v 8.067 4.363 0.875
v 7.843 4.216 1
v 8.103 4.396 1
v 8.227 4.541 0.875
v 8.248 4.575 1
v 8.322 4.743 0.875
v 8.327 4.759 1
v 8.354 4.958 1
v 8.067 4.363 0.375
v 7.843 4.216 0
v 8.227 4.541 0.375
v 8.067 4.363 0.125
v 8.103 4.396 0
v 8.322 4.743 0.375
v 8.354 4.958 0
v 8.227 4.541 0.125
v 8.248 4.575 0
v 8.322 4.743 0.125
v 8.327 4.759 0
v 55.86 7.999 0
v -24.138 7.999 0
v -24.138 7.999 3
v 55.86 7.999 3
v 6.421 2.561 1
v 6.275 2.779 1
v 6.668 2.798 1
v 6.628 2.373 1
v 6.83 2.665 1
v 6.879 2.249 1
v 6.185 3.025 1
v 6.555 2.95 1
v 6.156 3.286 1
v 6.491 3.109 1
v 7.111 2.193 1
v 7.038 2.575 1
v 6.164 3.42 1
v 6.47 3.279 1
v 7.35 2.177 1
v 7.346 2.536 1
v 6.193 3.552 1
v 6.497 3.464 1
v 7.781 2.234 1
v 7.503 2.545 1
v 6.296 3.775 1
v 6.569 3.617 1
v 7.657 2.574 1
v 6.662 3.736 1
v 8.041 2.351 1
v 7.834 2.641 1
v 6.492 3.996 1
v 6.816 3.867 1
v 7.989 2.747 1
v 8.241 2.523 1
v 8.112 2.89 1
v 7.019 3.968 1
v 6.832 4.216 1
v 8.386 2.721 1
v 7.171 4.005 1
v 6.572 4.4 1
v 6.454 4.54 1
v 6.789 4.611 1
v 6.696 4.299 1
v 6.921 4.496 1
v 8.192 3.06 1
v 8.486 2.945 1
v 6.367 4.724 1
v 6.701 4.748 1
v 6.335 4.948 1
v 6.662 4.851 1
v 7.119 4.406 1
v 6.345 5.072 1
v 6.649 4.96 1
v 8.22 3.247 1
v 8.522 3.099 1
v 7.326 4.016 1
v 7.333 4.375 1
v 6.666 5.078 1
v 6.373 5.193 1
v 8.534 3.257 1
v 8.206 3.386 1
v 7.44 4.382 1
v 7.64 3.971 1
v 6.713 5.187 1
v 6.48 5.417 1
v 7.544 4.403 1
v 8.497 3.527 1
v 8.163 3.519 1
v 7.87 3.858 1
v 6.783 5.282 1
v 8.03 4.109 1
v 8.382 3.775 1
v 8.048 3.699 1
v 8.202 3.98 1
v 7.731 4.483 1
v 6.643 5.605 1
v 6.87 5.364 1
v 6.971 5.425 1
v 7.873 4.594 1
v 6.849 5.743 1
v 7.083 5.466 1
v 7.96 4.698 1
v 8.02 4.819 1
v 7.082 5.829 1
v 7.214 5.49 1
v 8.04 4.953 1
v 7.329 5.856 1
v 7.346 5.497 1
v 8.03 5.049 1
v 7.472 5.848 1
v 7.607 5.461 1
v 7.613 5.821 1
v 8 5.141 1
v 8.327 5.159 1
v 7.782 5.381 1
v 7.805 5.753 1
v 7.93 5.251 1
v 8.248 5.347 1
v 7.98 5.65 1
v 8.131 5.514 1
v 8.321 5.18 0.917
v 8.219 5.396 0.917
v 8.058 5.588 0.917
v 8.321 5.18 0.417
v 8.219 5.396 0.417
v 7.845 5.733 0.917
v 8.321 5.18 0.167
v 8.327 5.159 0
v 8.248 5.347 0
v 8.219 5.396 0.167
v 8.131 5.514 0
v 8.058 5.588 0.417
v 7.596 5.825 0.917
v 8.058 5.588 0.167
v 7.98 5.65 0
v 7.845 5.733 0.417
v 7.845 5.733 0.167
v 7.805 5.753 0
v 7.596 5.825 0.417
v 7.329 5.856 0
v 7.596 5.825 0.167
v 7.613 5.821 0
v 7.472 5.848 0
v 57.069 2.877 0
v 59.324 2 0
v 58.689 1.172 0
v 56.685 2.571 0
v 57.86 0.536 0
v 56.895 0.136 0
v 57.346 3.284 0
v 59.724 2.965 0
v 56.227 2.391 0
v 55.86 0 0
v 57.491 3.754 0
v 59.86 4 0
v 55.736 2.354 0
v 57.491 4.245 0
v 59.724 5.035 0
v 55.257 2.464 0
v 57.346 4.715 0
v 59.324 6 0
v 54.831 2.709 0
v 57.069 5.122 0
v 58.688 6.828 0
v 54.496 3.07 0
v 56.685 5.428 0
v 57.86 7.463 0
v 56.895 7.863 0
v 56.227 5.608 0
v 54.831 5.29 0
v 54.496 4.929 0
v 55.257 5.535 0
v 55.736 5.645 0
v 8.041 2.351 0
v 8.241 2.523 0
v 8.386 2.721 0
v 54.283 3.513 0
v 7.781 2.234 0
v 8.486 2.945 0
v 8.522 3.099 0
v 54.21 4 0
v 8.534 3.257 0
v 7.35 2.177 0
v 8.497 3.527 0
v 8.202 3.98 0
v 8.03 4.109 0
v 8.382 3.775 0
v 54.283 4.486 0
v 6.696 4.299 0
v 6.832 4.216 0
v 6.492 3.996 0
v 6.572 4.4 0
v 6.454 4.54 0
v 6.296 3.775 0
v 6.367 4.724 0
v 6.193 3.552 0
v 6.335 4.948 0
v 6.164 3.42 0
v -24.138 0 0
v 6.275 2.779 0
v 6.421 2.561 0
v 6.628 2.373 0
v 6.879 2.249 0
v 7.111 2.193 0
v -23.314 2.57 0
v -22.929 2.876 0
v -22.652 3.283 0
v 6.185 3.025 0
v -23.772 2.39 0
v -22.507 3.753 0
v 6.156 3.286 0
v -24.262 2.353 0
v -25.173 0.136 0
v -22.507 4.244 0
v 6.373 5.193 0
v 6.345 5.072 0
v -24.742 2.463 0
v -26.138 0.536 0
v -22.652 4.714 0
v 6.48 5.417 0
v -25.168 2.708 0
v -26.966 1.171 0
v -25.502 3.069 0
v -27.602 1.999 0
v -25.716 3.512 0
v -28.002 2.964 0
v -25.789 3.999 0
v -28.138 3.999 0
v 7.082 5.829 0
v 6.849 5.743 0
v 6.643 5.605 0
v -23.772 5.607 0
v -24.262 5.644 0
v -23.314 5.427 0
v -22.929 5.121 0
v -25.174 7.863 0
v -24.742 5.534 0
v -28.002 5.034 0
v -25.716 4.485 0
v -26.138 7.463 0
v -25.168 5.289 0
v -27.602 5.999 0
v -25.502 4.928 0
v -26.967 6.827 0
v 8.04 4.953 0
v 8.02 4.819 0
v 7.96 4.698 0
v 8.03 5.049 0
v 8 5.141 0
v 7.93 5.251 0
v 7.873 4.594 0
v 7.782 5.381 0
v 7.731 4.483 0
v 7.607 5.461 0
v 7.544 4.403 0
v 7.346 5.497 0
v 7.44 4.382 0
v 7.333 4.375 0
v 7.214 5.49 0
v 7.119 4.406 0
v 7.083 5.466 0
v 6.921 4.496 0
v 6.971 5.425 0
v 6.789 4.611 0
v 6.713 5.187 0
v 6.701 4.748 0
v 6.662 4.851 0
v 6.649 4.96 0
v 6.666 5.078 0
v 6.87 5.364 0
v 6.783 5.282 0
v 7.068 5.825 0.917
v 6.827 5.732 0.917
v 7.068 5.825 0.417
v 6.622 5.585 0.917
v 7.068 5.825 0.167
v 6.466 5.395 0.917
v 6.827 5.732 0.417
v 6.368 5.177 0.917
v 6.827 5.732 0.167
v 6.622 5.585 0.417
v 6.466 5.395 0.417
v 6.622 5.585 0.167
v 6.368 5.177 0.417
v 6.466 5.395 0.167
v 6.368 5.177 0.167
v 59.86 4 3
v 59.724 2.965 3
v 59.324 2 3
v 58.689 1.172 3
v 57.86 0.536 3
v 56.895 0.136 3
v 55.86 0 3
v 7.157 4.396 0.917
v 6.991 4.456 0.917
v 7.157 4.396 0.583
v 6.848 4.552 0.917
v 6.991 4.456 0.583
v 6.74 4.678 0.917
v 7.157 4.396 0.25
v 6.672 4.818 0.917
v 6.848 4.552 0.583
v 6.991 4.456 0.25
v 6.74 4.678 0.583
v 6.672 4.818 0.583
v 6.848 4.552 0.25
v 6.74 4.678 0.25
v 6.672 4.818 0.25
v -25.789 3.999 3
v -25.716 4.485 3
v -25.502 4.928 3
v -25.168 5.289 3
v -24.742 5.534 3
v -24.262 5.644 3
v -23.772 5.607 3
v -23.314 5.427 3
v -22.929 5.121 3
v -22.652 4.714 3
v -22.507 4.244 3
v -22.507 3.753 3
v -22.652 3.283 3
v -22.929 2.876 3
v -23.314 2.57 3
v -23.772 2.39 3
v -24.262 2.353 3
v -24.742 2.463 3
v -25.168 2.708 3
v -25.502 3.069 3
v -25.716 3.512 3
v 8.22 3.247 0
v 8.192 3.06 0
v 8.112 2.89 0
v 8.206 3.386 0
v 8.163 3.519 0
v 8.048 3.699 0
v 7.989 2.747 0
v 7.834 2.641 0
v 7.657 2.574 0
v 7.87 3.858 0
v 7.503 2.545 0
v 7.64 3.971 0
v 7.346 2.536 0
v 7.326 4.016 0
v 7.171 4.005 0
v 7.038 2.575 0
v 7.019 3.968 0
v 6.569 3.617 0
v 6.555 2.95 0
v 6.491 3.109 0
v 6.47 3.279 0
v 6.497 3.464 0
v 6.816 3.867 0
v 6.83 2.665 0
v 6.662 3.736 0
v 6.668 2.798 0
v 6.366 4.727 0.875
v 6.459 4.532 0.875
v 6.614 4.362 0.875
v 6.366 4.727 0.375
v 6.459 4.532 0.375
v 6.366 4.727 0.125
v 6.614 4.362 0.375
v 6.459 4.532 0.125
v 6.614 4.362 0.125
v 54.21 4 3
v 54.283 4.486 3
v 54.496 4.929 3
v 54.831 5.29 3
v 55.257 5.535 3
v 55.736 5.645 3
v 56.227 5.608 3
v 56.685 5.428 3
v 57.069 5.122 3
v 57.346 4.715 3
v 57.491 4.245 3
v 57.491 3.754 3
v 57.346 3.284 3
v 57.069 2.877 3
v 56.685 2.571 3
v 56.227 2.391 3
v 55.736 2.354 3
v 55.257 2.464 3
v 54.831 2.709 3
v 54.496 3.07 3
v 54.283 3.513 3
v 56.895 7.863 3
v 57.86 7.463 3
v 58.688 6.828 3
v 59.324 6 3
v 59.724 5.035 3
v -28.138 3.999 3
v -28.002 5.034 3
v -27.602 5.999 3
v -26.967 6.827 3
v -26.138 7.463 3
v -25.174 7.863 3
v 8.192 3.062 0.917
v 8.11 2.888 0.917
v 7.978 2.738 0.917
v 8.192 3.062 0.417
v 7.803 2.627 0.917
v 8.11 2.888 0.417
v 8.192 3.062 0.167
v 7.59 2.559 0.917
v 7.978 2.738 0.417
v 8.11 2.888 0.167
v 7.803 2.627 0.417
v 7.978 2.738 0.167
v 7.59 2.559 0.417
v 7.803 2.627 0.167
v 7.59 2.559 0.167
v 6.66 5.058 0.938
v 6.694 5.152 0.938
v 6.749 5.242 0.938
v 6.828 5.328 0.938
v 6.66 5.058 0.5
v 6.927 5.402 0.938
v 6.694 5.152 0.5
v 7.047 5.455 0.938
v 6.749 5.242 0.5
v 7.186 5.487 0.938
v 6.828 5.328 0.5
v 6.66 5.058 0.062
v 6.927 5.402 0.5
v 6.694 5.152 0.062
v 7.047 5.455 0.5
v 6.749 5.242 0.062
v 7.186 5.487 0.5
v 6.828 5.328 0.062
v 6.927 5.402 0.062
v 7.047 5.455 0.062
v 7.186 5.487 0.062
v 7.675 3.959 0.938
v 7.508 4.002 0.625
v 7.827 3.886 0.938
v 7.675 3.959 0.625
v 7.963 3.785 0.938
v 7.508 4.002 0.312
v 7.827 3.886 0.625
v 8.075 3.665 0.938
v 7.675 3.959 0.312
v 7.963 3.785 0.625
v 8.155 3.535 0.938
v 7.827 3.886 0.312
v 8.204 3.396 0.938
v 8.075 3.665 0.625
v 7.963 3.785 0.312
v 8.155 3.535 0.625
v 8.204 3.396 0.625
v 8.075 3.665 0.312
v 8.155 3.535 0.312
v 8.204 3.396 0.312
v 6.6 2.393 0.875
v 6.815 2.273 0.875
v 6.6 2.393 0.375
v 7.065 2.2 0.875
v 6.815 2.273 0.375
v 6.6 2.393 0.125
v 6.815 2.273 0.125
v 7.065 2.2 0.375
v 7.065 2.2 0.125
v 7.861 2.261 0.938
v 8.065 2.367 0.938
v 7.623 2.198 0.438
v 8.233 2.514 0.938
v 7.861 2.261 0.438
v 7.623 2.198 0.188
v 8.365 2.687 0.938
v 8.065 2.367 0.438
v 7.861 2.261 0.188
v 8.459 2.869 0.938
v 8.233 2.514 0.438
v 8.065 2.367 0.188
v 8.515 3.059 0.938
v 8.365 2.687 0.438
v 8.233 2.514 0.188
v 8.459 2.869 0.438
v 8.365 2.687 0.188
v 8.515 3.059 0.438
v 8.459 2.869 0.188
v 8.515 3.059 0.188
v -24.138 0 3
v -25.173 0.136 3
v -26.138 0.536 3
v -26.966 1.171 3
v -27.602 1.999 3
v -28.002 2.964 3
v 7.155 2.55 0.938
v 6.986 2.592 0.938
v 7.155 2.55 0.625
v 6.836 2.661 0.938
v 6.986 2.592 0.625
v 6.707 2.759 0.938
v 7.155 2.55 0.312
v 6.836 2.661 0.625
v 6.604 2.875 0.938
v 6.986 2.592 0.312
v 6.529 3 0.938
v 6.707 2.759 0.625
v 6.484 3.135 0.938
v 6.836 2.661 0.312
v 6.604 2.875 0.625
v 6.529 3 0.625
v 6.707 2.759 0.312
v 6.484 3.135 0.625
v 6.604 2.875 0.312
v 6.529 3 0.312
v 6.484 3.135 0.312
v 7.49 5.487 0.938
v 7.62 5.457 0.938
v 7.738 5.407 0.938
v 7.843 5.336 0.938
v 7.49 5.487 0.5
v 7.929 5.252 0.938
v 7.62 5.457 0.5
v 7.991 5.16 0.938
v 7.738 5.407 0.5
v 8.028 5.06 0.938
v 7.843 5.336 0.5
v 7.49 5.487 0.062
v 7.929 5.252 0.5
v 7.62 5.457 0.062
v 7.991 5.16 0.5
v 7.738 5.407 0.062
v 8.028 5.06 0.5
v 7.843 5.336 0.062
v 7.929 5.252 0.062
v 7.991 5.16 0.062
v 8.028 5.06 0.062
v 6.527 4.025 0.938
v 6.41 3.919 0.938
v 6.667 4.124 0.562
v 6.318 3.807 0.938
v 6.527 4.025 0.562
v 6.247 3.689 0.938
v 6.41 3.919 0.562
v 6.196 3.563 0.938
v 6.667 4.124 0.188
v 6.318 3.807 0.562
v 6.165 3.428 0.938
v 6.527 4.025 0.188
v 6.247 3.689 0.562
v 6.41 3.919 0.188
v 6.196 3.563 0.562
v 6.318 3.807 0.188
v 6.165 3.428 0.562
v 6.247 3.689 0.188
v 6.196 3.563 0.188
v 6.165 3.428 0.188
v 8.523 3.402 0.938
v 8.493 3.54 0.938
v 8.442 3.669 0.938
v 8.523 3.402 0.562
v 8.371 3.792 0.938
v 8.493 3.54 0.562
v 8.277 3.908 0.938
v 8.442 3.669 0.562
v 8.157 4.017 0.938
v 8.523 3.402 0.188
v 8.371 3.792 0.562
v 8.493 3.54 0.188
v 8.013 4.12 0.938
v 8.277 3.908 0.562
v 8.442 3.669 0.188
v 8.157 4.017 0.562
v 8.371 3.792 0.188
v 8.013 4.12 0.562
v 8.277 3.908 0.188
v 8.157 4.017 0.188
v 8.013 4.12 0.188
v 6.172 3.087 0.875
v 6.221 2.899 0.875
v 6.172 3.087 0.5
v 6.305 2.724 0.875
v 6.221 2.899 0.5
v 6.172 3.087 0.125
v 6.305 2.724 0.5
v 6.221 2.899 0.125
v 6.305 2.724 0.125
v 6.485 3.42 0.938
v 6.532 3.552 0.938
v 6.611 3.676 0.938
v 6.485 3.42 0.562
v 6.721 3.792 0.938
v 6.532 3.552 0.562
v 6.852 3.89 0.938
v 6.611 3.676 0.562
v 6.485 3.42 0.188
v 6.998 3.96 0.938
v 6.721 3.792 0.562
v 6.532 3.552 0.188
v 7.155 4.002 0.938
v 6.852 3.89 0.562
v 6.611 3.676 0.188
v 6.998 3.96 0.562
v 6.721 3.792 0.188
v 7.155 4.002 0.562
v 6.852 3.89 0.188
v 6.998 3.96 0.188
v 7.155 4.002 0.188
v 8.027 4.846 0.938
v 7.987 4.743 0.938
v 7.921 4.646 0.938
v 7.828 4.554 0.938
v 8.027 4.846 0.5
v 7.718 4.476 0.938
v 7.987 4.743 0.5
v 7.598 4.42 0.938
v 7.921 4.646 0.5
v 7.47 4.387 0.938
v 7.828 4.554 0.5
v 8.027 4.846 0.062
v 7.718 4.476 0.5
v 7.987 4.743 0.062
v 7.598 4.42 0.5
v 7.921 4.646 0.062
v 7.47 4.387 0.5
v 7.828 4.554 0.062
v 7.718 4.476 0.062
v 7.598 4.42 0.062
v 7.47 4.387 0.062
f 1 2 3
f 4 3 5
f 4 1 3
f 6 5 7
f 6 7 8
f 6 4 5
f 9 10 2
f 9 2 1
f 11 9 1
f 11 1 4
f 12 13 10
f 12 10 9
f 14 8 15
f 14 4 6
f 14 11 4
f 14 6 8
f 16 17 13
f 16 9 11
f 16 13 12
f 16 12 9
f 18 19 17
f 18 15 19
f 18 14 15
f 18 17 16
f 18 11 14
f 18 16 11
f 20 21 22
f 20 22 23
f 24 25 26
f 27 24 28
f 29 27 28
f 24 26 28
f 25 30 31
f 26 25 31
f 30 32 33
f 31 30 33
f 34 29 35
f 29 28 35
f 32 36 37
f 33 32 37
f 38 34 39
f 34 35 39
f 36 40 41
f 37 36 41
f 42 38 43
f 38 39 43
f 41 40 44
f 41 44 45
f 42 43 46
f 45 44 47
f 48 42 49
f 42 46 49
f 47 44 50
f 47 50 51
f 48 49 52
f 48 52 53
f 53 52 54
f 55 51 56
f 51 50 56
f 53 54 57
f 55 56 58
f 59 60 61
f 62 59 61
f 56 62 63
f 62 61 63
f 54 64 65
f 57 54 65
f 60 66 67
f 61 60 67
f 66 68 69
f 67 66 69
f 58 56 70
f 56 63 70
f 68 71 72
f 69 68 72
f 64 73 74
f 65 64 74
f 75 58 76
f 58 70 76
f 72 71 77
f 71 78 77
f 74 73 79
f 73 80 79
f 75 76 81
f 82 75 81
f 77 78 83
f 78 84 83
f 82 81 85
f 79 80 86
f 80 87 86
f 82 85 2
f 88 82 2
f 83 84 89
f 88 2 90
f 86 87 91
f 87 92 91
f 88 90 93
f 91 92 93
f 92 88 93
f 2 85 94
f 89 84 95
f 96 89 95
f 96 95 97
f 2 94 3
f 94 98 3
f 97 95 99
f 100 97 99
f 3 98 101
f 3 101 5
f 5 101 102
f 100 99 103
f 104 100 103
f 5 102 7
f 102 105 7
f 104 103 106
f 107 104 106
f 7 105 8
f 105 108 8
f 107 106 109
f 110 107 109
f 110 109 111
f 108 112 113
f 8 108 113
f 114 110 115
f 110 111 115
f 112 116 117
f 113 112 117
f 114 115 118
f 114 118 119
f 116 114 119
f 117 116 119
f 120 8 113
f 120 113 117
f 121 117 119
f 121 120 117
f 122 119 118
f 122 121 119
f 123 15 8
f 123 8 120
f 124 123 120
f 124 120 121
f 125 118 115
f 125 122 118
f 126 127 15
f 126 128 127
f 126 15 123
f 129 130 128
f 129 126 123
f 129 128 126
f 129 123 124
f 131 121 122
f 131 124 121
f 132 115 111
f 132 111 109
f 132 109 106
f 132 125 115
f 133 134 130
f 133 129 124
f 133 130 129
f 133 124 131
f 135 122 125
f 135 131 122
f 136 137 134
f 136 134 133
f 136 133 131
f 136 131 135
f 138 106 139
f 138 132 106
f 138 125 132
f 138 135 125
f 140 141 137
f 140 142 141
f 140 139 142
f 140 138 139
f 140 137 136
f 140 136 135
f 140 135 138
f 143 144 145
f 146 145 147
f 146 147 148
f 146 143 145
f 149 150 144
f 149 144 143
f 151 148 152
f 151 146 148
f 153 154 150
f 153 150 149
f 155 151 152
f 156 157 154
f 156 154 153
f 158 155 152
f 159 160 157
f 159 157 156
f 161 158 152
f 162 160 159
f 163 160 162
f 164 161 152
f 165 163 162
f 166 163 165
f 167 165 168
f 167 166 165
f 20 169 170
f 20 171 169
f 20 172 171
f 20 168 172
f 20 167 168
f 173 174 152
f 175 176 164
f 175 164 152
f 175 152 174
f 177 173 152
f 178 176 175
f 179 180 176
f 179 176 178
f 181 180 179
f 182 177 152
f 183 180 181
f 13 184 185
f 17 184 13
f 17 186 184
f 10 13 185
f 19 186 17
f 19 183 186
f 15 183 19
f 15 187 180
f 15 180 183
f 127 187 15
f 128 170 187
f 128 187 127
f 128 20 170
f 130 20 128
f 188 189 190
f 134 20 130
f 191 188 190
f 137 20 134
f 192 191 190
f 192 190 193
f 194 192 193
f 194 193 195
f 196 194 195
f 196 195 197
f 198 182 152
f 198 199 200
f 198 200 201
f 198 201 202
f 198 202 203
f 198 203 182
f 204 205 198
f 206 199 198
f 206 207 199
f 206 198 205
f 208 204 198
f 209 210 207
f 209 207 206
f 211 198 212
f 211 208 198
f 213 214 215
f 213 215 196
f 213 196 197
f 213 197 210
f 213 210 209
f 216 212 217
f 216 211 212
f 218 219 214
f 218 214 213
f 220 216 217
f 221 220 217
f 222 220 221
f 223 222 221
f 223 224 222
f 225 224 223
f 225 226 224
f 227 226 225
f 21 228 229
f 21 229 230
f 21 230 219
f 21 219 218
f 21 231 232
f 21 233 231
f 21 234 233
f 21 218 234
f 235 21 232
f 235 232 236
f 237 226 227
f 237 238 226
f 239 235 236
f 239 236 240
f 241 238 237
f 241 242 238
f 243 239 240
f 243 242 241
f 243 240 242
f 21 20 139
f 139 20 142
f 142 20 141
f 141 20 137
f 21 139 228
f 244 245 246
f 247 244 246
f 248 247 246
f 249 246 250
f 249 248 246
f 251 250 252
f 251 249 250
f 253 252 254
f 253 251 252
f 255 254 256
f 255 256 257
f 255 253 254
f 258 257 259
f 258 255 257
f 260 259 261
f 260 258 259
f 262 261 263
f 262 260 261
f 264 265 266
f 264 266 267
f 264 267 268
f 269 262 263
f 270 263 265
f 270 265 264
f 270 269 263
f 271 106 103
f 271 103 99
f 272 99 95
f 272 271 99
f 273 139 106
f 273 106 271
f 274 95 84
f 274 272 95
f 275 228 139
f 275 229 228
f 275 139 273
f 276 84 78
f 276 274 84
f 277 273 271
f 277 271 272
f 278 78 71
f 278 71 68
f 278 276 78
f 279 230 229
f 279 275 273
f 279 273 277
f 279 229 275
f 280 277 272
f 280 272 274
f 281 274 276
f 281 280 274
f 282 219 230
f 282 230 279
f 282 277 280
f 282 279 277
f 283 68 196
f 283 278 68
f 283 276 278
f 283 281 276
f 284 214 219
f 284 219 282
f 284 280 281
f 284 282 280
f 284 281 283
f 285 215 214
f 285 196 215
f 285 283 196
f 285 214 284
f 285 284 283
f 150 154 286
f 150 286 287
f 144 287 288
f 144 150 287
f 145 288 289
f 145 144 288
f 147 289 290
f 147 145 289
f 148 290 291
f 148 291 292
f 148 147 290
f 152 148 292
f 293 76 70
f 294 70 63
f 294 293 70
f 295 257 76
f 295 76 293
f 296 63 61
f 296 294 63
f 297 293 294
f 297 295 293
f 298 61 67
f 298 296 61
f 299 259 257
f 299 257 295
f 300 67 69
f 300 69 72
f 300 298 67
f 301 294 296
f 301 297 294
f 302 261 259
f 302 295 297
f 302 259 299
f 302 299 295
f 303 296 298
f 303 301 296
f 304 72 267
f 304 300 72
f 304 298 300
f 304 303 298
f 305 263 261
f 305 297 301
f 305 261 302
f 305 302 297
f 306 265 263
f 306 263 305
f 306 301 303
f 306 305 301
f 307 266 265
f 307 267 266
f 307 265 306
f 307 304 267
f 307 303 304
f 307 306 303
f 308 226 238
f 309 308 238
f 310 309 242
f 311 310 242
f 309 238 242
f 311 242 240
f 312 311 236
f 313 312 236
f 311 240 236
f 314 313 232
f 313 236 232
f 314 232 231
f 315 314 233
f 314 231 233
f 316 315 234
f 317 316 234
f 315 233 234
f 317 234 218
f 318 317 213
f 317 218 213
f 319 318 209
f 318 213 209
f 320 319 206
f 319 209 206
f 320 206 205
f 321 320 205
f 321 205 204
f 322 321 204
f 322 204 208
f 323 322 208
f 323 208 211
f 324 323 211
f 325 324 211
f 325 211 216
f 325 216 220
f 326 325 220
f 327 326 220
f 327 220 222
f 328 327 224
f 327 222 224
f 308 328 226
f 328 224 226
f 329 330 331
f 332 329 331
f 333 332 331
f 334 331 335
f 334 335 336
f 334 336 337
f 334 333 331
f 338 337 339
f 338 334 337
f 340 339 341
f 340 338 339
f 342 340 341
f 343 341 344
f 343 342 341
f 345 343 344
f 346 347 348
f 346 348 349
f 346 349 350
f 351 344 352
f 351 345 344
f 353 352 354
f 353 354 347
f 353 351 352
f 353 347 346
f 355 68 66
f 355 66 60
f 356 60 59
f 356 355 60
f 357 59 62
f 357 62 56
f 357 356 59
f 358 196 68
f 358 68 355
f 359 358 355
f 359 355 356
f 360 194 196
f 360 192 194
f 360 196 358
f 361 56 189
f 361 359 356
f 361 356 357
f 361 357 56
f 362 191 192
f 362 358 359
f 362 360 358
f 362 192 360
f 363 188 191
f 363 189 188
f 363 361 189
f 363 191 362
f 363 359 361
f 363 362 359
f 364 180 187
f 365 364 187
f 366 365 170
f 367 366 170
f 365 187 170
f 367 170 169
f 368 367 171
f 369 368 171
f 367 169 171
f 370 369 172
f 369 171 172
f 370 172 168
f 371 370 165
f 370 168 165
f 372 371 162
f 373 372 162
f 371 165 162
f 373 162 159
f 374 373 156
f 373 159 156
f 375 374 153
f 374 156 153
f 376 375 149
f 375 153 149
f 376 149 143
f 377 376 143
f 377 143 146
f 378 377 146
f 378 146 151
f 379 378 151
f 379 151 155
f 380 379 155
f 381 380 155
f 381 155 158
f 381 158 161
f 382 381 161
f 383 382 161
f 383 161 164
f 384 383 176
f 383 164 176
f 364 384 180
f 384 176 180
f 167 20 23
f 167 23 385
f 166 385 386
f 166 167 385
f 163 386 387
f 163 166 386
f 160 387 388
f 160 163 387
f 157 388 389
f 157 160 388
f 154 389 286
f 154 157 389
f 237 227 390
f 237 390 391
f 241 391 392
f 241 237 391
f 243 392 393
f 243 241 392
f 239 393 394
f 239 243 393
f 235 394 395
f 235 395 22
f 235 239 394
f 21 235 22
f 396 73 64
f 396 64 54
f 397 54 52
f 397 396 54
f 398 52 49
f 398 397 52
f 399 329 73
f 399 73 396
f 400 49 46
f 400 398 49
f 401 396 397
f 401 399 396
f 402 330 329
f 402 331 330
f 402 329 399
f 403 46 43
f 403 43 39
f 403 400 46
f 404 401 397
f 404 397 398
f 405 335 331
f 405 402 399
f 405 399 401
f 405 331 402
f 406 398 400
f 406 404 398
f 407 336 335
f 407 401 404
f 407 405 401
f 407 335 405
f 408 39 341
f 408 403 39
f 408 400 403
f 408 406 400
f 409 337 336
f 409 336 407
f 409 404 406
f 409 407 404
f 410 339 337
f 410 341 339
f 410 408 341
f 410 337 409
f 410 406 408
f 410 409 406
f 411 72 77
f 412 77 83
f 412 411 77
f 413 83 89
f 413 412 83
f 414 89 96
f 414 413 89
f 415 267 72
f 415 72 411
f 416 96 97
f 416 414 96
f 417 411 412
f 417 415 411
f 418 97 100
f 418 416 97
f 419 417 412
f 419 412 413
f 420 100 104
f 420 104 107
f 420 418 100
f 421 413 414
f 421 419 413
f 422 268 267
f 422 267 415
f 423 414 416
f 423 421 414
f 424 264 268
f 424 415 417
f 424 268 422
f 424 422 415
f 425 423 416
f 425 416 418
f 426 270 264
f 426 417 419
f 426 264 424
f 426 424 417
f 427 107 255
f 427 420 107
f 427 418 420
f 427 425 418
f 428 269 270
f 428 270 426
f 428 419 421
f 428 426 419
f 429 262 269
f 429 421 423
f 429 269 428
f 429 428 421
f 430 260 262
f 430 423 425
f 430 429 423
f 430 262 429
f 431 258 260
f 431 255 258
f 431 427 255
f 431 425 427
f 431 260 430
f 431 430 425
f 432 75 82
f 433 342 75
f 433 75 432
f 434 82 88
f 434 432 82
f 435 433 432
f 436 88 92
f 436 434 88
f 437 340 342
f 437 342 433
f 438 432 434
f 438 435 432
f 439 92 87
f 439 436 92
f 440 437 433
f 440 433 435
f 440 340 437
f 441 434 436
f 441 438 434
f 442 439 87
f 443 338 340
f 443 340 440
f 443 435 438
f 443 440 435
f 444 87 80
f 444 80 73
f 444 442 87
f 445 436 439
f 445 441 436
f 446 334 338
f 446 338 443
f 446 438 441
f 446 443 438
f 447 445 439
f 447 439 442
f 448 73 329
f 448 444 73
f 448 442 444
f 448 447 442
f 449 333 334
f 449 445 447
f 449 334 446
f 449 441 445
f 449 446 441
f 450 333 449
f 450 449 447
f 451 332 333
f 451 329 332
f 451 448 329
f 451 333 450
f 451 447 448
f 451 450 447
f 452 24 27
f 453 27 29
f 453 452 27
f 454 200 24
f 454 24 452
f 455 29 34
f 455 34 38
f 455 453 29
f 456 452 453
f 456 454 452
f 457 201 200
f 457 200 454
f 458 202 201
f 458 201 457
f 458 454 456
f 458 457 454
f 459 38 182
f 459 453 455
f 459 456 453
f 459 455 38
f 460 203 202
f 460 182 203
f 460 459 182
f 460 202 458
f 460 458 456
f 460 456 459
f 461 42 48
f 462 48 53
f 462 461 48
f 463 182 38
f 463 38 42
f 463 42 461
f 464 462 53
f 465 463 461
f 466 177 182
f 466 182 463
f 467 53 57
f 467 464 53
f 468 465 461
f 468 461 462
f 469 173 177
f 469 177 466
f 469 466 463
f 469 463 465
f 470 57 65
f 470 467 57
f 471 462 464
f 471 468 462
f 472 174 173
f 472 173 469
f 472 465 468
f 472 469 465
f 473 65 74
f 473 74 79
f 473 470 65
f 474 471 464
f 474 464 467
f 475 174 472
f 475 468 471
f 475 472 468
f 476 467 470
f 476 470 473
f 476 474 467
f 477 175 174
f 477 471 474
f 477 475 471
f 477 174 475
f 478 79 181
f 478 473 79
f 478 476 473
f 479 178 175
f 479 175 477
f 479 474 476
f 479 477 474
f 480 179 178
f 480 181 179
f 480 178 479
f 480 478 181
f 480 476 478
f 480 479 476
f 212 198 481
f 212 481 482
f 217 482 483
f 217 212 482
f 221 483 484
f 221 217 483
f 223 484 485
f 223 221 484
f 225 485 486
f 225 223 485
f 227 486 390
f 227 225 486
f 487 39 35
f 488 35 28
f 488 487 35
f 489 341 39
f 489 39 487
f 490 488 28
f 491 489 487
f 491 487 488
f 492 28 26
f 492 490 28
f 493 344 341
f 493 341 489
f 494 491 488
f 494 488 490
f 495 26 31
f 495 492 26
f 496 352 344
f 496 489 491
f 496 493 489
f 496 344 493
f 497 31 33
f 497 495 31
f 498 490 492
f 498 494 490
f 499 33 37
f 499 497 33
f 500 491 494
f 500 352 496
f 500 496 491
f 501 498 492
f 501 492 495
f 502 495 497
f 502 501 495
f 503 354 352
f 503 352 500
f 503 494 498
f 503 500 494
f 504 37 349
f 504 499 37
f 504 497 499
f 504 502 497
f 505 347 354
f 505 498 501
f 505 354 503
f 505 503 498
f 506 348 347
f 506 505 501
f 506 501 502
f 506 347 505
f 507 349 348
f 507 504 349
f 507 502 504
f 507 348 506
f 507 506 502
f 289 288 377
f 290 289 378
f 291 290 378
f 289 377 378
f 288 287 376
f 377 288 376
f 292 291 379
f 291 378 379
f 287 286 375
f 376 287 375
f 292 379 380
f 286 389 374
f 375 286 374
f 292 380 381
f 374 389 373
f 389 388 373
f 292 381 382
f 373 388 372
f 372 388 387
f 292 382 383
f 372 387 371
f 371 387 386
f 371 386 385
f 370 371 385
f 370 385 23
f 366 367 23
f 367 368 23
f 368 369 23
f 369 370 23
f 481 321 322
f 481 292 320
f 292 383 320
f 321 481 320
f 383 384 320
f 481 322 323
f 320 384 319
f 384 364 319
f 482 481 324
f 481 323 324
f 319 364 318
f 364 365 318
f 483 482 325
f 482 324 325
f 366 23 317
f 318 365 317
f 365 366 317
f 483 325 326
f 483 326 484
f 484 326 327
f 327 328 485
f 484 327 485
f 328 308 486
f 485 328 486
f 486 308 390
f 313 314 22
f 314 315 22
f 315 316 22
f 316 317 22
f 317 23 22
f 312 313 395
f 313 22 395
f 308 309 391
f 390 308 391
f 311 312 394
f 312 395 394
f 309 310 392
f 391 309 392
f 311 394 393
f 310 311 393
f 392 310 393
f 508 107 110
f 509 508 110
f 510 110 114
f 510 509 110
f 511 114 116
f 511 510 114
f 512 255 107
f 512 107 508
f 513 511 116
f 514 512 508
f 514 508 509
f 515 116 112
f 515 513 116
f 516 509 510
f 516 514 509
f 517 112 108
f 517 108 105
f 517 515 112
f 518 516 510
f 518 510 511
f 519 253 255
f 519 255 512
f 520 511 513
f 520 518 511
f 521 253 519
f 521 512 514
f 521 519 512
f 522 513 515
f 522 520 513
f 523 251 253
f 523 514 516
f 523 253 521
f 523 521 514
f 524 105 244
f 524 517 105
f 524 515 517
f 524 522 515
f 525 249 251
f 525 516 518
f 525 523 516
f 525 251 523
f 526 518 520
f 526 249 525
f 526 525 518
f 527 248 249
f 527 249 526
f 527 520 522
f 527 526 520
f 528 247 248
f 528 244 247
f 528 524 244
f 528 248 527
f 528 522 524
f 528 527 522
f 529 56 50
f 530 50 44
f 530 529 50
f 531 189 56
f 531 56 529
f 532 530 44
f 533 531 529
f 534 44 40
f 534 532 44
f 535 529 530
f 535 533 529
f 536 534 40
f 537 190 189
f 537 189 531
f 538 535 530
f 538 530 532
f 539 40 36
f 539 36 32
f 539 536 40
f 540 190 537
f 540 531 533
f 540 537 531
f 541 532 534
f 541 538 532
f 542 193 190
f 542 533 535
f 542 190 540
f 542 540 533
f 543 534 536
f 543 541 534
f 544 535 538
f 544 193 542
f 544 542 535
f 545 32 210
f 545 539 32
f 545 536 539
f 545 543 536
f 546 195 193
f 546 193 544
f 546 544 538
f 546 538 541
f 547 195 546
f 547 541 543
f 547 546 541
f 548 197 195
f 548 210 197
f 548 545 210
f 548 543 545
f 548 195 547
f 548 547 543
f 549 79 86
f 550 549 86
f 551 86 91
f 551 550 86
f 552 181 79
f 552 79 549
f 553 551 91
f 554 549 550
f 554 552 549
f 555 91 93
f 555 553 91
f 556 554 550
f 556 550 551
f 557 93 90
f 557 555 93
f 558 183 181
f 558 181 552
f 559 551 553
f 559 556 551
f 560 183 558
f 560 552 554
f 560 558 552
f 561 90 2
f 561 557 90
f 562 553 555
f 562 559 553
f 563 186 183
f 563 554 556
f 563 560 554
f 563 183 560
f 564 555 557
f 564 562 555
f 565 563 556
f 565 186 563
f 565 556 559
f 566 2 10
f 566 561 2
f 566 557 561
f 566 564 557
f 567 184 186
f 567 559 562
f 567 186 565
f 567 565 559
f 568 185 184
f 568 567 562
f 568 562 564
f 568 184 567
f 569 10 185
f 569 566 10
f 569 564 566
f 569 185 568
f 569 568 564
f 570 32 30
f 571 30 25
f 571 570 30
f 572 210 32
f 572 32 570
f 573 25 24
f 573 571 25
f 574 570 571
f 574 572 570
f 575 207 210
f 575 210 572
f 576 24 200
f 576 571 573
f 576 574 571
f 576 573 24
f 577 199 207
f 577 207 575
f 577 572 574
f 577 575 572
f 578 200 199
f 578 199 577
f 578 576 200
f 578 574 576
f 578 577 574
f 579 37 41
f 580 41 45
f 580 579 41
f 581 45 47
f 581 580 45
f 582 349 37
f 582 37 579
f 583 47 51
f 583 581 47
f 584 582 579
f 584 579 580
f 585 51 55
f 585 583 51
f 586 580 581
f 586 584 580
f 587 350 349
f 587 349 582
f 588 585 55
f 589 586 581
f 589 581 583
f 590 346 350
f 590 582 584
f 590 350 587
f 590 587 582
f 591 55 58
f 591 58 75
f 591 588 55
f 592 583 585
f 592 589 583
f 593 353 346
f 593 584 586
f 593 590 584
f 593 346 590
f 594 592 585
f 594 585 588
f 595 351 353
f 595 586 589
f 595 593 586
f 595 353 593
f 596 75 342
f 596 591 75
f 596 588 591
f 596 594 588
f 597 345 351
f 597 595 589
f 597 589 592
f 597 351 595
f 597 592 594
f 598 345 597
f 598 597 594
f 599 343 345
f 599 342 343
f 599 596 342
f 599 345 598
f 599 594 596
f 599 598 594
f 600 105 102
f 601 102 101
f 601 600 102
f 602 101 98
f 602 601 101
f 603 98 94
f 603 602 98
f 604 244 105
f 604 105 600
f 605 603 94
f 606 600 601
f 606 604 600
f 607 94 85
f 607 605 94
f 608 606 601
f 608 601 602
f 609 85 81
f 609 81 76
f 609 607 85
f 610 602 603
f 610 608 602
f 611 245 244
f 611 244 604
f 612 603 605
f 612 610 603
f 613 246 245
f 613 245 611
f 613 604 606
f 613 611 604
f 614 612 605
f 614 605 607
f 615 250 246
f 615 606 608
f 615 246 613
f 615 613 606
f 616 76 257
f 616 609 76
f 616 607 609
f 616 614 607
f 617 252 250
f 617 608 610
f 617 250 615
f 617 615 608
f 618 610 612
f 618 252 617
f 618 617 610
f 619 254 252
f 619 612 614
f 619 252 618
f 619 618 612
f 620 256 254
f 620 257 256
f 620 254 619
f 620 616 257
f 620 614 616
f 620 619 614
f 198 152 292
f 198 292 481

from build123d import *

# Parameters (mm, degrees)
SKETCH_1_R          = 1.65
EXTRUDE_1_DEPTH     = 3
CUT_EXTRUDE_1_DEPTH = 1


with BuildPart() as part:
    # 草图1 → 凸台-拉伸1 (new body)
    with BuildSketch(Plane(origin=(0, 0, 0), x_dir=(-1, 0, 0), z_dir=(0, 0, -1))):
        with BuildLine():
            Line((-55.860221974, 0), (24.13832066, 0))
            ThreePointArc((24.13832066, 0), (26.966394209, 1.171219344), (28.138320535, 3.999))
            ThreePointArc((28.138320535, 3.999), (26.96674766, 6.827427125), (24.138320535, 7.999))
            Line((24.138320535, 7.999), (-55.860222099, 7.999))
            ThreePointArc((-55.860222099, 7.999), (-58.688295648, 6.827780656), (-59.860221974, 4))
            ThreePointArc((-59.860221974, 4), (-58.688649099, 1.171572875), (-55.860221974, 0))
        make_face()
        with Locations((24.138809001, 3.998511534)):
            Circle(SKETCH_1_R, mode=Mode.SUBTRACT)
        with Locations((-55.859733508, 3.999511534)):
            Circle(SKETCH_1_R, mode=Mode.SUBTRACT)
    extrude(amount=-EXTRUDE_1_DEPTH)

    # 草图2 → 切除-拉伸1 (cut)
    with BuildSketch(Plane(origin=(0, 0, 0), x_dir=(-1, 0, 0), z_dir=(0, 0, -1))):
        with BuildLine():
            add(Edge.make_bspline(
                [(-6.832159624, 4.216174383), (-6.803511077, 4.201236427), (-6.747636843, 4.172102424), (-6.668059635, 4.125191596), (-6.595334633, 4.075750631), (-6.527444071, 4.026114772), (-6.465580721, 3.974383121), (-6.410436308, 3.920349964), (-6.360648688, 3.865364019), (-6.317221904, 3.808494179), (-6.279025067, 3.74989153), (-6.246012932, 3.689402257), (-6.217795729, 3.627158923), (-6.19543279, 3.562482093), (-6.177010999, 3.496321831), (-6.164335394, 3.42782385), (-6.157518476, 3.357439509), (-6.156229662, 3.309871207), (-6.155577092, 3.285785761)],
                knots=[0, 0, 0, 0, 1.272397273, 2.481599622, 3.635517121, 4.734568067, 5.792894095, 6.808321871, 7.773003508, 8.711915296, 9.623354172, 10.525449501, 11.423591555, 12.311487226, 13.218079475, 14.126165749, 15.051214107, 16, 16, 16, 16], degree=3))
            add(Edge.make_bspline(
                [(-6.155577092, 3.285785761), (-6.156348513, 3.252088028), (-6.157875444, 3.185387572), (-6.171175428, 3.08694146), (-6.191088406, 2.991329678), (-6.220167918, 2.898573187), (-6.257881309, 2.809183814), (-6.304358145, 2.723085041), (-6.35696935, 2.638865731), (-6.39922159, 2.58704633), (-6.420601131, 2.560825825)],
                knots=[0, 0, 0, 0, 1.025265484, 2.029385089, 3.018602448, 3.995076438, 4.983346944, 5.966715145, 6.97116228, 8, 8, 8, 8], degree=3))
            add(Edge.make_bspline(
                [(-6.420601131, 2.560825825), (-6.448437605, 2.530232051), (-6.503766571, 2.469422558), (-6.598549498, 2.390471748), (-6.702571382, 2.324122354), (-6.815429715, 2.27005046), (-6.936822816, 2.227964601), (-7.066724821, 2.197722083), (-7.205388974, 2.180399654), (-7.300694445, 2.177895664), (-7.349587509, 2.176611082)],
                knots=[0, 0, 0, 0, 0.954267603, 1.896743057, 2.838368354, 3.796610408, 4.779680527, 5.799409237, 6.871065594, 8, 8, 8, 8], degree=3))
            add(Edge.make_bspline(
                [(-7.349587509, 2.176611082), (-7.396600898, 2.177763559), (-7.488084177, 2.180006165), (-7.621242054, 2.195200596), (-7.745365124, 2.221828463), (-7.861175092, 2.258273072), (-7.967973786, 2.3056833), (-8.065456887, 2.364691709), (-8.155030859, 2.432923151), (-8.233977333, 2.51233723), (-8.304065777, 2.597395102), (-8.36563383, 2.685146712), (-8.416807908, 2.775600069), (-8.460135004, 2.867406436), (-8.493303026, 2.96185259), (-8.516275237, 3.058452604), (-8.530864551, 3.157037746), (-8.532805685, 3.2235694), (-8.533782221, 3.257039767)],
                knots=[0, 0, 0, 0, 1.256902934, 2.445805442, 3.576955095, 4.645999104, 5.686449165, 6.692658513, 7.68621702, 8.689161843, 9.678783111, 10.630372946, 11.551080876, 12.453998257, 13.34127905, 14.221779781, 15.105423033, 16, 16, 16, 16], degree=3))
            add(Edge.make_bspline(
                [(-8.533782221, 3.257039767), (-8.53320434, 3.281598959), (-8.532062243, 3.330136591), (-8.524157394, 3.40184592), (-8.511448933, 3.471642054), (-8.494189476, 3.539782798), (-8.47079845, 3.605772071), (-8.442556317, 3.669922544), (-8.409624364, 3.732306643), (-8.371543199, 3.793265524), (-8.327241175, 3.851945037), (-8.277077525, 3.909341031), (-8.220049657, 3.964562898), (-8.156791998, 4.018285323), (-8.088027458, 4.071461297), (-8.011969928, 4.121217026), (-7.93063566, 4.17107499), (-7.872830255, 4.200883316), (-7.843177253, 4.216174383)],
                knots=[0, 0, 0, 0, 0.941657376, 1.861047343, 2.762797495, 3.66048619, 4.553285746, 5.444104102, 6.34607688, 7.256116206, 8.197091036, 9.162375105, 10.176350973, 11.237807142, 12.343728897, 13.50695164, 14.721116704, 16, 16, 16, 16], degree=3))
            add(Edge.make_bspline(
                [(-7.843177253, 4.216174383), (-7.883768627, 4.238309151), (-7.96236489, 4.281168259), (-8.066434331, 4.359915065), (-8.155824955, 4.44520288), (-8.228079672, 4.538832675), (-8.284951901, 4.637879549), (-8.323970505, 4.741723801), (-8.350366989, 4.848439915), (-8.352981816, 4.921346111), (-8.354295041, 4.957961242)],
                knots=[0, 0, 0, 0, 1.166880483, 2.259407225, 3.286803203, 4.280235371, 5.237608625, 6.161067461, 7.076446754, 8, 8, 8, 8], degree=3))
            add(Edge.make_bspline(
                [(-8.354295041, 4.957961242), (-8.352659617, 4.9952588), (-8.349372129, 5.070233397), (-8.322788809, 5.18183952), (-8.279468742, 5.291456085), (-8.220547745, 5.398551798), (-8.147160529, 5.499502013), (-8.059113983, 5.590042959), (-7.958510686, 5.669354442), (-7.845852819, 5.735930614), (-7.724616584, 5.790114273), (-7.59670086, 5.827492696), (-7.464334367, 5.851928813), (-7.374236647, 5.854695467), (-7.328553855, 5.856098261)],
                knots=[0, 0, 0, 0, 0.888701115, 1.786444228, 2.72001202, 3.692817113, 4.693886446, 5.687152267, 6.695133018, 7.739871481, 8.800368666, 9.853104506, 10.91144658, 12, 12, 12, 12], degree=3))
            add(Edge.make_bspline(
                [(-7.328553855, 5.856098261), (-7.28405004, 5.854651918), (-7.196293587, 5.851799894), (-7.06729896, 5.828013016), (-6.943874082, 5.788283496), (-6.826444583, 5.734386273), (-6.717112716, 5.667999332), (-6.620510406, 5.587598458), (-6.535177824, 5.497456907), (-6.46459343, 5.396537304), (-6.406430541, 5.28985311), (-6.36592964, 5.178230589), (-6.339977666, 5.064081531), (-6.336704302, 4.986843527), (-6.335064272, 4.948145537)],
                knots=[0, 0, 0, 0, 1.072916533, 2.115669174, 3.151510826, 4.193348718, 5.225979165, 6.227137561, 7.216255879, 8.211077061, 9.189680878, 10.138522389, 11.067357538, 12, 12, 12, 12], degree=3))
            add(Edge.make_bspline(
                [(-6.335064272, 4.948145537), (-6.336498833, 4.910168873), (-6.339316228, 4.835584863), (-6.363016168, 4.726858343), (-6.402929481, 4.625036304), (-6.457423644, 4.528963352), (-6.528449132, 4.440381854), (-6.615057865, 4.358165384), (-6.716559343, 4.281638556), (-6.792820229, 4.238452192), (-6.832159624, 4.216174383)],
                knots=[0, 0, 0, 0, 0.975232327, 1.915300861, 2.843280834, 3.77672583, 4.742871857, 5.749627742, 6.839139064, 8, 8, 8, 8], degree=3))
        make_face()
        with BuildLine():
            add(Edge.make_bspline(
                [(-7.3460819, 5.497123902), (-7.370632706, 5.496472461), (-7.418664817, 5.495197959), (-7.489093488, 5.488539322), (-7.556065856, 5.475586105), (-7.620281656, 5.458347394), (-7.680860468, 5.435059405), (-7.738625023, 5.407664396), (-7.792592213, 5.374358331), (-7.843413516, 5.336997133), (-7.88916429, 5.295904227), (-7.929768842, 5.253090508), (-7.963496956, 5.207715116), (-7.992138066, 5.160906756), (-8.012919583, 5.11127618), (-8.028483887, 5.060345003), (-8.039005278, 5.007469619), (-8.039793669, 4.971333109), (-8.040192477, 4.953053389)],
                knots=[0, 0, 0, 0, 1.203892937, 2.355340988, 3.463153438, 4.544400666, 5.610487187, 6.640501085, 7.674077295, 8.714426146, 9.728707835, 10.68524104, 11.601827946, 12.495867327, 13.368432065, 14.231010473, 15.105153427, 16, 16, 16, 16], degree=3))
            add(Edge.make_bspline(
                [(-8.040192477, 4.953053389), (-8.03950511, 4.93477288), (-8.038146774, 4.898647967), (-8.027641646, 4.845302101), (-8.011984792, 4.792880464), (-7.98733413, 4.742629553), (-7.957767772, 4.692806194), (-7.921276296, 4.644655608), (-7.877787268, 4.598010223), (-7.828759828, 4.553266782), (-7.77534829, 4.511368019), (-7.718764246, 4.474994837), (-7.659717855, 4.444560727), (-7.598815786, 4.419231322), (-7.535437339, 4.399541384), (-7.469970865, 4.385572738), (-7.402405363, 4.376890741), (-7.356624782, 4.37585372), (-7.333461708, 4.37532903)],
                knots=[0, 0, 0, 0, 0.873023192, 1.725219244, 2.590779336, 3.480155217, 4.391973325, 5.357036234, 6.360879153, 7.436073238, 8.526419356, 9.601555421, 10.645666583, 11.697338044, 12.750135903, 13.812665442, 14.89329948, 16, 16, 16, 16], degree=3))
            add(Edge.make_bspline(
                [(-7.333461708, 4.37532903), (-7.303711604, 4.376201897), (-7.244505236, 4.37793901), (-7.157225905, 4.394090184), (-7.07236326, 4.419496102), (-6.990824356, 4.454256068), (-6.914719771, 4.497883928), (-6.846879702, 4.550116946), (-6.78788281, 4.609749043), (-6.738342199, 4.675851879), (-6.699932353, 4.746203467), (-6.670030545, 4.81680376), (-6.65256933, 4.888405991), (-6.650291763, 4.936372955), (-6.649166836, 4.960064607)],
                knots=[0, 0, 0, 0, 1.076279235, 2.141928126, 3.20205304, 4.278698113, 5.344010996, 6.36967002, 7.368914609, 8.37248503, 9.349703398, 10.264243087, 11.142681841, 12, 12, 12, 12], degree=3))
            add(Edge.make_bspline(
                [(-6.649166836, 4.960064607), (-6.649698734, 4.976692643), (-6.650754474, 5.009696911), (-6.65945453, 5.058435276), (-6.673830363, 5.10606486), (-6.693293443, 5.152979131), (-6.718903238, 5.198519863), (-6.749267425, 5.243402951), (-6.786151927, 5.286618714), (-6.82754836, 5.329174263), (-6.874493769, 5.368558287), (-6.926897681, 5.403192997), (-6.984491431, 5.432605353), (-7.047276381, 5.456494108), (-7.115021306, 5.474436458), (-7.18741418, 5.487872806), (-7.265058627, 5.495445917), (-7.318488378, 5.496552443), (-7.3460819, 5.497123902)],
                knots=[0, 0, 0, 0, 0.814439003, 1.616544685, 2.417341072, 3.248991801, 4.09997495, 4.973547432, 5.9003056, 6.880240646, 7.880314356, 8.896779544, 9.951930927, 11.043077905, 12.18215768, 13.381699519, 14.647792085, 16, 16, 16, 16], degree=3))
        make_face(mode=Mode.SUBTRACT)
        with BuildLine():
            add(Edge.make_bspline(
                [(-7.325749368, 4.016354671), (-7.356875154, 4.01580103), (-7.41793635, 4.014714921), (-7.507393278, 4.00262542), (-7.593246444, 3.985796027), (-7.67520638, 3.960265189), (-7.753238477, 3.927068698), (-7.82776516, 3.887134158), (-7.898216289, 3.839928715), (-7.963619015, 3.7860521), (-8.023342345, 3.727992646), (-8.075740645, 3.666530511), (-8.120238165, 3.602807978), (-8.156071416, 3.536015749), (-8.185483148, 3.467568138), (-8.204797026, 3.395760542), (-8.217178737, 3.321973429), (-8.218841369, 3.271813331), (-8.219679657, 3.24652294)],
                knots=[0, 0, 0, 0, 1.140299081, 2.23698856, 3.303958914, 4.344563908, 5.37730929, 6.408454204, 7.439741482, 8.480804886, 9.510774543, 10.48932336, 11.43758569, 12.353841022, 13.263987381, 14.161954604, 15.073269652, 16, 16, 16, 16], degree=3))
            add(Edge.make_bspline(
                [(-8.219679657, 3.24652294), (-8.218316398, 3.215092034), (-8.215611724, 3.152733851), (-8.194155085, 3.06057078), (-8.15971955, 2.971349725), (-8.111694334, 2.885797772), (-8.052226761, 2.805847666), (-7.979100293, 2.73615889), (-7.896859456, 2.674237412), (-7.802721602, 2.624156878), (-7.699893136, 2.584162023), (-7.588401407, 2.55660606), (-7.469846488, 2.538364611), (-7.387986896, 2.536526429), (-7.3460819, 2.53558544)],
                knots=[0, 0, 0, 0, 0.898778495, 1.783155532, 2.693654817, 3.627872908, 4.583023416, 5.533784346, 6.509005473, 7.520592997, 8.575161974, 9.658835044, 10.801527049, 12, 12, 12, 12], degree=3))
            add(Edge.make_bspline(
                [(-7.3460819, 2.53558544), (-7.313331532, 2.536214249), (-7.249523313, 2.537439369), (-7.156437364, 2.548253664), (-7.068592816, 2.565403288), (-6.986160017, 2.590346834), (-6.908216178, 2.620796811), (-6.836082823, 2.659968892), (-6.767904296, 2.704521215), (-6.707040174, 2.757379372), (-6.651606965, 2.813858867), (-6.603273672, 2.87364891), (-6.561316121, 2.935124542), (-6.528385165, 2.999675027), (-6.502058912, 3.066061941), (-6.483135357, 3.134897453), (-6.471459142, 3.206392685), (-6.470278246, 3.254891757), (-6.469679657, 3.279475665)],
                knots=[0, 0, 0, 0, 1.224942928, 2.386581632, 3.501229538, 4.569074225, 5.605009692, 6.626002462, 7.634866581, 8.645888296, 9.63523824, 10.59253846, 11.518950513, 12.414518923, 13.29783783, 14.186679152, 15.080837789, 16, 16, 16, 16], degree=3))
            add(Edge.make_bspline(
                [(-6.469679657, 3.279475665), (-6.470585505, 3.303353005), (-6.47237168, 3.35043495), (-6.483708372, 3.420201477), (-6.503624249, 3.487604291), (-6.530951646, 3.553454297), (-6.567332608, 3.616417248), (-6.610177478, 3.678133419), (-6.661871597, 3.736889864), (-6.720284193, 3.79314296), (-6.783943154, 3.845158696), (-6.851610299, 3.891173135), (-6.922764761, 3.929925251), (-6.997255971, 3.961441747), (-7.074918527, 3.986229216), (-7.155695306, 4.003545211), (-7.239680881, 4.014444814), (-7.296735752, 4.01571086), (-7.325749368, 4.016354671)],
                knots=[0, 0, 0, 0, 0.917430815, 1.809013306, 2.70690318, 3.612392954, 4.541220862, 5.495268465, 6.494511384, 7.542276156, 8.608045339, 9.649016899, 10.681629292, 11.715607085, 12.752076957, 13.808767841, 14.885711793, 16, 16, 16, 16], degree=3))
        make_face(mode=Mode.SUBTRACT)
    extrude(amount=-CUT_EXTRUDE_1_DEPTH, mode=Mode.SUBTRACT)


solid = part.part
